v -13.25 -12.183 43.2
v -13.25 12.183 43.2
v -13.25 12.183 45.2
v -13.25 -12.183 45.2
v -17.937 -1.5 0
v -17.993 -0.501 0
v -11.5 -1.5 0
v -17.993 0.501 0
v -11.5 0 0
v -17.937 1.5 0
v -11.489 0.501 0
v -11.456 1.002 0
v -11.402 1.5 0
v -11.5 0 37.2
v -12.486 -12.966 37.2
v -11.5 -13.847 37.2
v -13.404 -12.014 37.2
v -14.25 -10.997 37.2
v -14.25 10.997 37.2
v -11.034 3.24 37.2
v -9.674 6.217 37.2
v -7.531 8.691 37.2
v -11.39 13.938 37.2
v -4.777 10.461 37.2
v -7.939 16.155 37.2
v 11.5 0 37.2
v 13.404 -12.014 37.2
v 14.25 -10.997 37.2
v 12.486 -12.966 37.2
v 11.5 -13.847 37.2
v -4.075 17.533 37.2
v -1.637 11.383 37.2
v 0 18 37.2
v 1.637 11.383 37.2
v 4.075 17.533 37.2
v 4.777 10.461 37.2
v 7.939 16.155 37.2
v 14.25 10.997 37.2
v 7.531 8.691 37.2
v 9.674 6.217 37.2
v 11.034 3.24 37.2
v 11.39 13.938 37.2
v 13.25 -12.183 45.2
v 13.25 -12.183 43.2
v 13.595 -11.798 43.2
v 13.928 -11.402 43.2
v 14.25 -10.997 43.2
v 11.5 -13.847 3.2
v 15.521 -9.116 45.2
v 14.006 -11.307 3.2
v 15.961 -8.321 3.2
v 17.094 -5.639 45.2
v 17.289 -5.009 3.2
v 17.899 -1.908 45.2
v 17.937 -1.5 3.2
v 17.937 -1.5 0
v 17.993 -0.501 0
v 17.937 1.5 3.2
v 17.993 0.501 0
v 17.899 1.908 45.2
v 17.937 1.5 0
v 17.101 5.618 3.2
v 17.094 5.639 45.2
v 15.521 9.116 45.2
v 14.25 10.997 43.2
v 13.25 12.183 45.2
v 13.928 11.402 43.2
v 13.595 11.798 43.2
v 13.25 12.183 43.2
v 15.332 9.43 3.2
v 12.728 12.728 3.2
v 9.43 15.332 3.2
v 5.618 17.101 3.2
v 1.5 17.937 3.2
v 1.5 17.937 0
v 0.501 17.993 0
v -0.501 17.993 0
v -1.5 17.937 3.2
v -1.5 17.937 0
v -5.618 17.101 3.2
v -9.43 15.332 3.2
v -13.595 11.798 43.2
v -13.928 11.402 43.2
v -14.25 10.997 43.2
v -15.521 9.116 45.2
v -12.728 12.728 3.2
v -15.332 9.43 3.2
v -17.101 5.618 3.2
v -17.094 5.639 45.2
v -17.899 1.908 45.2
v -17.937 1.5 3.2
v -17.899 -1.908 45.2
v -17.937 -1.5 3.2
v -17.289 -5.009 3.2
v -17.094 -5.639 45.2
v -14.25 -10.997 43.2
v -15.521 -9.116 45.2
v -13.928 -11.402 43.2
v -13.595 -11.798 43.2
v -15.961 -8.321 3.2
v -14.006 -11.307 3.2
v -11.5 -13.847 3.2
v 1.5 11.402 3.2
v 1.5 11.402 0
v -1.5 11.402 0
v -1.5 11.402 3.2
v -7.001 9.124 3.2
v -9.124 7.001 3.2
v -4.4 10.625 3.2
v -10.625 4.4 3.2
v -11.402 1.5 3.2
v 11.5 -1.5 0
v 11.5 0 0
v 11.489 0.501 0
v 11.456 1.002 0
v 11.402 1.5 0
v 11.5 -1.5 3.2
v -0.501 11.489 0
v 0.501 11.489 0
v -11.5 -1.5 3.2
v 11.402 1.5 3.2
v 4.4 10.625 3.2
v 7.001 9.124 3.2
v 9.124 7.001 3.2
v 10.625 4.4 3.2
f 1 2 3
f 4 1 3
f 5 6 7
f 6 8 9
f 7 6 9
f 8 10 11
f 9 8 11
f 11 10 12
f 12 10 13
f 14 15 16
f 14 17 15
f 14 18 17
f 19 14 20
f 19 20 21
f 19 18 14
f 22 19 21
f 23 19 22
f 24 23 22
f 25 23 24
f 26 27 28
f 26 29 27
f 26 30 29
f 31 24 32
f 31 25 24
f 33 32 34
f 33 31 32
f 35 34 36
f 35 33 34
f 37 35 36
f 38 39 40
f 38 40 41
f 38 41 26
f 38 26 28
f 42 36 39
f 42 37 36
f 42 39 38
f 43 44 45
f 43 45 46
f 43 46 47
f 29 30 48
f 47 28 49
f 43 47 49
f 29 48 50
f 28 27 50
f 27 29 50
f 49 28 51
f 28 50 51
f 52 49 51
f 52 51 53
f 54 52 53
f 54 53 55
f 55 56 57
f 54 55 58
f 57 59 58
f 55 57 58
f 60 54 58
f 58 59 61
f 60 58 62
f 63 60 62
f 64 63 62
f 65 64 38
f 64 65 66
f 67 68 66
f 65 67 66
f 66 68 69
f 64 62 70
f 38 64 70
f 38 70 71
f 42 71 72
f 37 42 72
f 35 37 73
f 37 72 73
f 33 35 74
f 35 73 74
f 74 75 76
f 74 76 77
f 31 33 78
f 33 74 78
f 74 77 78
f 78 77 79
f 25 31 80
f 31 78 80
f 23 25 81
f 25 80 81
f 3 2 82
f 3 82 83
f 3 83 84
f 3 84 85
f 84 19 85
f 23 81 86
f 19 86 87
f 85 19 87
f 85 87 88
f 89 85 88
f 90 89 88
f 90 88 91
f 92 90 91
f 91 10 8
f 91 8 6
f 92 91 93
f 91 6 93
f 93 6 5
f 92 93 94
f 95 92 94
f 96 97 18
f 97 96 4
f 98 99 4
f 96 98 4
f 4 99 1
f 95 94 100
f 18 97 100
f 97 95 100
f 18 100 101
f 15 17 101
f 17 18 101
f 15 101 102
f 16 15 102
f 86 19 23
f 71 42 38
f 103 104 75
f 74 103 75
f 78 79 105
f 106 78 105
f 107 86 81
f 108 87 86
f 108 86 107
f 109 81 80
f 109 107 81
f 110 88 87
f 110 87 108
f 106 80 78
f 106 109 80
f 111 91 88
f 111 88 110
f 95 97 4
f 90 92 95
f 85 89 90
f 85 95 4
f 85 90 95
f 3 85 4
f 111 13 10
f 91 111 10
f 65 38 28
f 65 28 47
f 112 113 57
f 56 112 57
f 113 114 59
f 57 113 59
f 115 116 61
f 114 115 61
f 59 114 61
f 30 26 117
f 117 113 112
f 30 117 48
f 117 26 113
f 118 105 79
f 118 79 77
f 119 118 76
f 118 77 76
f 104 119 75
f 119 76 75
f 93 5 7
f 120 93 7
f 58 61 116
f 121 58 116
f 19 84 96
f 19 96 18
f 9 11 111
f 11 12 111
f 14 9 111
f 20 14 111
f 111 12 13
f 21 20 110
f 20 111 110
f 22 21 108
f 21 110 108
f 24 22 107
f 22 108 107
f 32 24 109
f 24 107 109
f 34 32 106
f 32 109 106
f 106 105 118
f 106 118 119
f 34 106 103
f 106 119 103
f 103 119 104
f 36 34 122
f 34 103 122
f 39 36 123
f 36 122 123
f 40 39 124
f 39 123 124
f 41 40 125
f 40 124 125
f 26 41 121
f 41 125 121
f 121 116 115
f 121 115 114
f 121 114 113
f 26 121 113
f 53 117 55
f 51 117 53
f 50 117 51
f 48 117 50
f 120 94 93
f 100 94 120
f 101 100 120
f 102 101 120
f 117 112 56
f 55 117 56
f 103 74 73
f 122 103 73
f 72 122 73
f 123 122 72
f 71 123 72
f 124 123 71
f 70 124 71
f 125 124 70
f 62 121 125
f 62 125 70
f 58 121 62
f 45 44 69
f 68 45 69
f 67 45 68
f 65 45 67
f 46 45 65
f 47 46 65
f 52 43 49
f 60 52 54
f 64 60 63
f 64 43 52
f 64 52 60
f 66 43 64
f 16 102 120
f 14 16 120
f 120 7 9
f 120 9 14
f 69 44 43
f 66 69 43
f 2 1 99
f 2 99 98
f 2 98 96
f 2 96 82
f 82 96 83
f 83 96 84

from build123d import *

# Parameters (mm, degrees)
F1_DEPTH = 45.2
F2_W     = 26.5
F2_H     = 2
F3_DEPTH = 18.001
F4_DEPTH = 13.848382
F6_DEPTH = 3.2


with BuildPart() as f1:
    # F0 (on Top) → F1 (new body)
    with BuildSketch(Plane.XY):
        with BuildLine():
            Line((11.5, 0), (11.5, -13.847382))
            ThreePointArc((11.5, -13.847382), (0, 18), (-11.5, -13.847382))
            Line((-11.5, -13.847382), (-11.5, 0))
            ThreePointArc((-11.5, 0), (0, 11.5), (11.5, 0))
        make_face()
    extrude(amount=F1_DEPTH)

    # F2 (on Front) → F3 (cut, through all)
    with BuildSketch(Plane.XZ):
        Polygon((-13.25, 43.2), (-14.25, 43.2), (-14.25, 37.2), (14.25, 37.2), (14.25, 43.2), (13.25, 43.2), align=None)
        with Locations((0, 44.2)):
            Rectangle(F2_W, F2_H)
    extrude(amount=-F3_DEPTH, mode=Mode.SUBTRACT)

    # F2 (on Front) → F4 (cut, through all)
    with BuildSketch(Plane.XZ):
        Polygon((-13.25, 43.2), (-14.25, 43.2), (-14.25, 37.2), (14.25, 37.2), (14.25, 43.2), (13.25, 43.2), align=None)
        with Locations((0, 44.2)):
            Rectangle(F2_W, F2_H)
    extrude(amount=F4_DEPTH, mode=Mode.SUBTRACT)

    # F5 (on face) → F6 (cut)
    with BuildSketch(Plane(origin=(0, 0, 0), x_dir=(1, 0, 0), z_dir=(0, 0, -1))):
        with BuildLine():
            ThreePointArc((-11.5, 13.847382), (-15.961029, 8.32139), (-17.937391, 1.5))
            Line((-17.937391, 1.5), (-11.5, 1.5))
            Line((-11.5, 1.5), (-11.5, 13.847382))
        make_face()
        with BuildLine():
            ThreePointArc((-17.937391, -1.5), (-12.727922, -12.727922), (-1.5, -17.937391))
            Line((-1.5, -17.937391), (-1.5, -11.401754))
            ThreePointArc((-1.5, -11.401754), (-8.131728, -8.131728), (-11.401754, -1.5))
            Line((-11.401754, -1.5), (-17.937391, -1.5))
        make_face()
        with BuildLine():
            Line((1.5, -11.401754), (1.5, -17.937391))
            ThreePointArc((1.5, -17.937391), (12.727922, -12.727922), (17.937391, -1.5))
            Line((17.937391, -1.5), (11.401754, -1.5))
            ThreePointArc((11.401754, -1.5), (8.131728, -8.131728), (1.5, -11.401754))
        make_face()
        with BuildLine():
            Line((11.5, 1.5), (17.937391, 1.5))
            ThreePointArc((17.937391, 1.5), (15.961029, 8.32139), (11.5, 13.847382))
            Line((11.5, 13.847382), (11.5, 1.5))
        make_face()
    extrude(amount=-F6_DEPTH, mode=Mode.SUBTRACT)


solid = f1.part
